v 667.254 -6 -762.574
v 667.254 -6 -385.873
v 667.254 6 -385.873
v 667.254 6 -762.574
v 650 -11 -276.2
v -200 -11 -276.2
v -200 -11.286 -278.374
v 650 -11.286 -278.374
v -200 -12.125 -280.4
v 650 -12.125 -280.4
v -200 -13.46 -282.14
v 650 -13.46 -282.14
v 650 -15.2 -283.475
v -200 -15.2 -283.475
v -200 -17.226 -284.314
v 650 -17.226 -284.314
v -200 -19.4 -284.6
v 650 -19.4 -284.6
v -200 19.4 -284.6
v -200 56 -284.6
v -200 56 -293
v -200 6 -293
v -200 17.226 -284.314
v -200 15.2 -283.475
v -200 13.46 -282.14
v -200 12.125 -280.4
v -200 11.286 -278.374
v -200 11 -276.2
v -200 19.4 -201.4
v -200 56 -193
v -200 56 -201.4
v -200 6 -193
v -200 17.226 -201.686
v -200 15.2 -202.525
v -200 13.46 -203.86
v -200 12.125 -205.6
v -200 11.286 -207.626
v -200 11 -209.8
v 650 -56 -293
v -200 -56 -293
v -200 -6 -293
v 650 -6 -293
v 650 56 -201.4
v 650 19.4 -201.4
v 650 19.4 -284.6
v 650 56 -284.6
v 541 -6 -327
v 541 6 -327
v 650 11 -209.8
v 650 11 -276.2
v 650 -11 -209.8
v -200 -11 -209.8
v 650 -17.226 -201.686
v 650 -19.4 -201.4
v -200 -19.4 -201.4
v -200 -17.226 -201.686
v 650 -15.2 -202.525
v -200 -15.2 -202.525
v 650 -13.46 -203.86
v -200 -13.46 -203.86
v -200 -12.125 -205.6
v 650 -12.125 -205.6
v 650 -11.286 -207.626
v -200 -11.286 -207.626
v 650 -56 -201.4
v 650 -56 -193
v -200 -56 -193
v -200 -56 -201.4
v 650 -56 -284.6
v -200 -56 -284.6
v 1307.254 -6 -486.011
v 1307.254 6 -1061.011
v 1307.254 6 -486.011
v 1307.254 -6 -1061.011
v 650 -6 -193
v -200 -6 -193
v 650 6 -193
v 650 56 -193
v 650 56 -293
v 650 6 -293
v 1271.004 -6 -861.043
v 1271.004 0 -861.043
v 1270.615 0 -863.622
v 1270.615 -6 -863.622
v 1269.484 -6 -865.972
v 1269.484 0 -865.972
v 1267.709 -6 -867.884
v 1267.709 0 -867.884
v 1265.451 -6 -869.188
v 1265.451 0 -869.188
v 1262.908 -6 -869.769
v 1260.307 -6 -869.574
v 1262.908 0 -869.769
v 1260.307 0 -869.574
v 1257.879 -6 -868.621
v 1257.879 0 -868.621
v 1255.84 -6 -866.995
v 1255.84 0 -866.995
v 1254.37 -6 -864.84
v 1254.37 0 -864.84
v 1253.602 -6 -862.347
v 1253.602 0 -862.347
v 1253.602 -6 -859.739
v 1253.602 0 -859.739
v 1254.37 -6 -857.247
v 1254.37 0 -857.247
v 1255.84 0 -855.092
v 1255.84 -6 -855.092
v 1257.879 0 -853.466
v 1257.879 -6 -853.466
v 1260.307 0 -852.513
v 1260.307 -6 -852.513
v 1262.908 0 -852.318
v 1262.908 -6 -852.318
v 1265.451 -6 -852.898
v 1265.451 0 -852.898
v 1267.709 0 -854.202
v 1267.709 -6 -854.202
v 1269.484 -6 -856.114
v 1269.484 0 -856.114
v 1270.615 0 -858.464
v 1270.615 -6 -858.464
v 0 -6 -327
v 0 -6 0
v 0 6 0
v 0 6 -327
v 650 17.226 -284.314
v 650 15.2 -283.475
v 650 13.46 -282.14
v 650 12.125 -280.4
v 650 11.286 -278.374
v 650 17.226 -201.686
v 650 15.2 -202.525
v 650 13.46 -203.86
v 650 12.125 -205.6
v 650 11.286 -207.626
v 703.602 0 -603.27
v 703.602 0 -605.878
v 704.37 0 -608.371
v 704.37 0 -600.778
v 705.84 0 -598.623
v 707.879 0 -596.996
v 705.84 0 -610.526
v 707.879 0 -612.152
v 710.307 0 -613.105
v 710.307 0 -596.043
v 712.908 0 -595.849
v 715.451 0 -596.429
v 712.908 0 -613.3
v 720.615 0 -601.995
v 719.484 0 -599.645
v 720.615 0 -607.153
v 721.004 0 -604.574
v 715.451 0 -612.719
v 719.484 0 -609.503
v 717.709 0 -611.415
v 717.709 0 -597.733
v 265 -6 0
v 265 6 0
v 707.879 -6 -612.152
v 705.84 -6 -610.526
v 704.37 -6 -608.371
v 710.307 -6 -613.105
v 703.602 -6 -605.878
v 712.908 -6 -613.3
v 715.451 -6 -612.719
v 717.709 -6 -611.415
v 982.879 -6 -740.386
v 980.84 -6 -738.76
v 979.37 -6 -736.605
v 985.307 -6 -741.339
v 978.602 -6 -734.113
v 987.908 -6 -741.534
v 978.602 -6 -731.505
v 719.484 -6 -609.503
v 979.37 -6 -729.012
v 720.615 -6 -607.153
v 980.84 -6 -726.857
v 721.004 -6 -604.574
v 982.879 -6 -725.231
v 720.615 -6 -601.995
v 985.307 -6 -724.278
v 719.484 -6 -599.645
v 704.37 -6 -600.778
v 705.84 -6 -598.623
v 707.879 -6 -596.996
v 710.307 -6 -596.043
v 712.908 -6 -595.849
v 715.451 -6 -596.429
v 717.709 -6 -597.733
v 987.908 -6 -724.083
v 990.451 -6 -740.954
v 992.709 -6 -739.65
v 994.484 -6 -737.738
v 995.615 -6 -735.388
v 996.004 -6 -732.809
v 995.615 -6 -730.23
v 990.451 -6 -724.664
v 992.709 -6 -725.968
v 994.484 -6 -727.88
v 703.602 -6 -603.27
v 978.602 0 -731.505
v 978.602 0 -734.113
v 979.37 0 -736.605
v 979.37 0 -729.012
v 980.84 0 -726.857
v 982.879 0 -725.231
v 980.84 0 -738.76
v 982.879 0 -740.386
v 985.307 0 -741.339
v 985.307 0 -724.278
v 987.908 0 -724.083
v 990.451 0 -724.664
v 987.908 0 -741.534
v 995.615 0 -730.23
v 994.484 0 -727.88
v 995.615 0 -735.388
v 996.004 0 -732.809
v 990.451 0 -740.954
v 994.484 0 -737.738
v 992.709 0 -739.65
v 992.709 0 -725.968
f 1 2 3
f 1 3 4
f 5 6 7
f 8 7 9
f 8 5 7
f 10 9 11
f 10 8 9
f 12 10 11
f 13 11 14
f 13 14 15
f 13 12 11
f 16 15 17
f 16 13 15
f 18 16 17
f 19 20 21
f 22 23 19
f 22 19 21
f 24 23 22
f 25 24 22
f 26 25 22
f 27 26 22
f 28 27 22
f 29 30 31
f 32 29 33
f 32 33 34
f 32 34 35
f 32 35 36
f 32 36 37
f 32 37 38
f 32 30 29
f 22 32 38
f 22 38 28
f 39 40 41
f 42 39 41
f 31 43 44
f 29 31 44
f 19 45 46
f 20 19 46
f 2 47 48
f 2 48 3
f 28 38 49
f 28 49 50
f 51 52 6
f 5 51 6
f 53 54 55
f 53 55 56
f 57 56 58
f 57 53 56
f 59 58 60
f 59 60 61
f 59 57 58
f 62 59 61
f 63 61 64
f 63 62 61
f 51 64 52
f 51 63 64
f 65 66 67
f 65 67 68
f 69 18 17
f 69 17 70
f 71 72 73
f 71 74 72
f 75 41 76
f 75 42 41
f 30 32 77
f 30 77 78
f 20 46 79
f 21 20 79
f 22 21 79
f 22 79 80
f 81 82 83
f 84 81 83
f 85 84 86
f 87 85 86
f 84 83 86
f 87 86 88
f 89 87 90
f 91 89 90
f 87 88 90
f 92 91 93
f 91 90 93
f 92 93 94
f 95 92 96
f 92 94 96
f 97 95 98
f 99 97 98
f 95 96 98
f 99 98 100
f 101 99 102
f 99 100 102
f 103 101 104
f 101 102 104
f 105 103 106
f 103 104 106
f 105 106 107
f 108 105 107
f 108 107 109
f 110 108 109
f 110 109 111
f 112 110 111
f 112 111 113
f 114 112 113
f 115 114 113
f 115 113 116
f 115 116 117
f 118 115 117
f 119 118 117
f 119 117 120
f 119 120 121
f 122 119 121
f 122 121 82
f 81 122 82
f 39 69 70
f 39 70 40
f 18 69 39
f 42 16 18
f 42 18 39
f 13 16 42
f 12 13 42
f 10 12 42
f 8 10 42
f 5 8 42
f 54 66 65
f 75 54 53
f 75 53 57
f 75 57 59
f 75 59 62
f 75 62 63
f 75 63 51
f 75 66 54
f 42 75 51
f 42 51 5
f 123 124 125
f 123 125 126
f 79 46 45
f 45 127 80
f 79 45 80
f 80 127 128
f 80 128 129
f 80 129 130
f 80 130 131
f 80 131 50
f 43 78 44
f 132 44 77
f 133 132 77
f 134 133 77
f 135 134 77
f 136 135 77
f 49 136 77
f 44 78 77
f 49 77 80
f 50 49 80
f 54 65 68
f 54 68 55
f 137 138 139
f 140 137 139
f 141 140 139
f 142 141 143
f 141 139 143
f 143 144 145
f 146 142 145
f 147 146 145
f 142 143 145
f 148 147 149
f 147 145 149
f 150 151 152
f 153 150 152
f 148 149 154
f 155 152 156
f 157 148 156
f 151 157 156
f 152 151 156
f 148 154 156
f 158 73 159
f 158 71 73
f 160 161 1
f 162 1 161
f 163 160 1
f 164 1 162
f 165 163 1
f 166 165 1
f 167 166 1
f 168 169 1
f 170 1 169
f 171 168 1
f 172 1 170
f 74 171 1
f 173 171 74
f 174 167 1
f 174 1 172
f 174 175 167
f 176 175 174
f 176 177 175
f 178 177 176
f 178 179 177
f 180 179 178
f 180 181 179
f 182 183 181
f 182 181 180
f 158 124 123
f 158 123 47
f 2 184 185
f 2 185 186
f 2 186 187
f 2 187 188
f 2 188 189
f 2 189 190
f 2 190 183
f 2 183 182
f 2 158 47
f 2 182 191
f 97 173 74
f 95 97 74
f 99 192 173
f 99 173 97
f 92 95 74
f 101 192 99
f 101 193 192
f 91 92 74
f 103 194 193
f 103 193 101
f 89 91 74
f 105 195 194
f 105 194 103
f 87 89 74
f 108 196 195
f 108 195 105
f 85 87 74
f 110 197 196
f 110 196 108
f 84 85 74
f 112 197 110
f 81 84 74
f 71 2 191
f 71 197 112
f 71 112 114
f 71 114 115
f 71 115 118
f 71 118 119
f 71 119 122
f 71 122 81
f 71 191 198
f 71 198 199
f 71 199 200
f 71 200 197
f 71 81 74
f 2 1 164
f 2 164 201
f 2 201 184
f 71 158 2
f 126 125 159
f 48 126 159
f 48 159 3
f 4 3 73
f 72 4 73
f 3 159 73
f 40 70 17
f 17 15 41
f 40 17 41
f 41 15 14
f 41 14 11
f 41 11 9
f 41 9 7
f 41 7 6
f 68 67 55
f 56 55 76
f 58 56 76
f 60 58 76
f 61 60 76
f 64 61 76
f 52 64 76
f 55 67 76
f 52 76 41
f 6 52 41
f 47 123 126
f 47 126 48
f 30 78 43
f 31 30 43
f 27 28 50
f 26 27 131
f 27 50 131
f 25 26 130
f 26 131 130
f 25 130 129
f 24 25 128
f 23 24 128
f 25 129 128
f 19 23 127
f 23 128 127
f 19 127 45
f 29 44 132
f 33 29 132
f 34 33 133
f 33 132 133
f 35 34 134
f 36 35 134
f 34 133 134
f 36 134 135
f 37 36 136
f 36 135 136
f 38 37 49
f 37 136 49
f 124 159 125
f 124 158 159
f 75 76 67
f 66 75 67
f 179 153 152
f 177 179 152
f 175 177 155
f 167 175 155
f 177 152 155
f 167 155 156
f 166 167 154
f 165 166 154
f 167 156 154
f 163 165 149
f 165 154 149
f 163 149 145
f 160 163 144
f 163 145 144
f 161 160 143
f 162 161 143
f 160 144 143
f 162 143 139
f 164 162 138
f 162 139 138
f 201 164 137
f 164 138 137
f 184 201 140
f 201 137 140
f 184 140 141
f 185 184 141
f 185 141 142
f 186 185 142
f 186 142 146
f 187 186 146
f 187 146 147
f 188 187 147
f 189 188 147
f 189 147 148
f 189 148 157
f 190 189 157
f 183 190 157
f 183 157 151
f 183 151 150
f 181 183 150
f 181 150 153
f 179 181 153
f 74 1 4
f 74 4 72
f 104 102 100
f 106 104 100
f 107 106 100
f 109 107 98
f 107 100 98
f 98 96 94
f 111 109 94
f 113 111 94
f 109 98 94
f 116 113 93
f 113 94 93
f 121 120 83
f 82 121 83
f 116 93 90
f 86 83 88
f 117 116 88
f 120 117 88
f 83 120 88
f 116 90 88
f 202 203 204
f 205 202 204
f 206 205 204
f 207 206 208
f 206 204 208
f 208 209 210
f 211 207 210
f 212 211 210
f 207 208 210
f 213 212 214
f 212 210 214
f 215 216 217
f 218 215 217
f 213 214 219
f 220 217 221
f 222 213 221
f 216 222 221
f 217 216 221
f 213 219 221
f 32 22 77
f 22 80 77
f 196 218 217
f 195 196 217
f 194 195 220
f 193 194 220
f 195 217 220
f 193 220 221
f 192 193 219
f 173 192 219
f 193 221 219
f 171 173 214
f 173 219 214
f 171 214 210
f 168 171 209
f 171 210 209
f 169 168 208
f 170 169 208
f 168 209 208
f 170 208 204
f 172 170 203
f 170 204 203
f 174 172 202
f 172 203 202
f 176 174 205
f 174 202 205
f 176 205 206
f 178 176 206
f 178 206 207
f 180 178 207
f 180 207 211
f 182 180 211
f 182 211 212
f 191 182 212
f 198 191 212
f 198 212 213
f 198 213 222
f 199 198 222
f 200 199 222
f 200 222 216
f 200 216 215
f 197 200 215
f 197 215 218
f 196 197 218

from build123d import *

# Parameters (mm, degrees)
F1_DEPTH      = 6
F2_D          = 17.5
F2_DEPTH      = 6.001
F4_DEPTH      = 650
F4_DEPTH_BACK = 200


with BuildPart() as f1:
    # F0 (on Front) → F1 (new body, symmetric)
    with BuildSketch(Plane.XZ):
        Polygon((265, 0), (0, 0), (0, -327), (541, -327), (667.2539550921, -385.8731861318), (667.2539550921, -762.5740997826), (1307.2539550921, -1061.0110010018), (1307.2539550921, -486.0110010018), align=None)
    extrude(amount=F1_DEPTH, both=True)

    # F2 (through all, one way)
    with BuildSketch(Plane(origin=(0, 0, 0), x_dir=(1, 0, 0), z_dir=(0, 1, 0))):
        with Locations((712.2539550921, 604.5740997826), (987.2539550921, 732.8087057752), (1262.2539550921, 861.0433117679)):
            Circle(F2_D / 2)
    extrude(amount=-F2_DEPTH, mode=Mode.SUBTRACT)


with BuildPart() as f4:
    # F3 (on Right) → F4 (new body, two sides)
    with BuildSketch(Plane.YZ) as f4_sk:
        with BuildLine():
            Line((-6, -193), (-56, -193))
            Line((-56, -193), (-56, -201.4))
            Line((-56, -201.4), (-19.4, -201.4))
            ThreePointArc((-19.4, -201.4), (-13.460303038, -203.860303038), (-11, -209.8))
            Line((-11, -209.8), (-11, -276.2))
            ThreePointArc((-11, -276.2), (-13.460303038, -282.139696962), (-19.4, -284.6))
            Line((-19.4, -284.6), (-56, -284.6))
            Line((-56, -284.6), (-56, -293))
            Line((-56, -293), (-6, -293))
            Line((-6, -293), (-6, -193))
        make_face()
    extrude(amount=F4_DEPTH)
    extrude(f4_sk.sketch, amount=-F4_DEPTH_BACK)


with BuildPart() as f5_1:
    # F5: instance of F4
    add(f4.part.mirror(Plane.XZ))


solid = Compound([f1.part, f4.part, f5_1.part])
